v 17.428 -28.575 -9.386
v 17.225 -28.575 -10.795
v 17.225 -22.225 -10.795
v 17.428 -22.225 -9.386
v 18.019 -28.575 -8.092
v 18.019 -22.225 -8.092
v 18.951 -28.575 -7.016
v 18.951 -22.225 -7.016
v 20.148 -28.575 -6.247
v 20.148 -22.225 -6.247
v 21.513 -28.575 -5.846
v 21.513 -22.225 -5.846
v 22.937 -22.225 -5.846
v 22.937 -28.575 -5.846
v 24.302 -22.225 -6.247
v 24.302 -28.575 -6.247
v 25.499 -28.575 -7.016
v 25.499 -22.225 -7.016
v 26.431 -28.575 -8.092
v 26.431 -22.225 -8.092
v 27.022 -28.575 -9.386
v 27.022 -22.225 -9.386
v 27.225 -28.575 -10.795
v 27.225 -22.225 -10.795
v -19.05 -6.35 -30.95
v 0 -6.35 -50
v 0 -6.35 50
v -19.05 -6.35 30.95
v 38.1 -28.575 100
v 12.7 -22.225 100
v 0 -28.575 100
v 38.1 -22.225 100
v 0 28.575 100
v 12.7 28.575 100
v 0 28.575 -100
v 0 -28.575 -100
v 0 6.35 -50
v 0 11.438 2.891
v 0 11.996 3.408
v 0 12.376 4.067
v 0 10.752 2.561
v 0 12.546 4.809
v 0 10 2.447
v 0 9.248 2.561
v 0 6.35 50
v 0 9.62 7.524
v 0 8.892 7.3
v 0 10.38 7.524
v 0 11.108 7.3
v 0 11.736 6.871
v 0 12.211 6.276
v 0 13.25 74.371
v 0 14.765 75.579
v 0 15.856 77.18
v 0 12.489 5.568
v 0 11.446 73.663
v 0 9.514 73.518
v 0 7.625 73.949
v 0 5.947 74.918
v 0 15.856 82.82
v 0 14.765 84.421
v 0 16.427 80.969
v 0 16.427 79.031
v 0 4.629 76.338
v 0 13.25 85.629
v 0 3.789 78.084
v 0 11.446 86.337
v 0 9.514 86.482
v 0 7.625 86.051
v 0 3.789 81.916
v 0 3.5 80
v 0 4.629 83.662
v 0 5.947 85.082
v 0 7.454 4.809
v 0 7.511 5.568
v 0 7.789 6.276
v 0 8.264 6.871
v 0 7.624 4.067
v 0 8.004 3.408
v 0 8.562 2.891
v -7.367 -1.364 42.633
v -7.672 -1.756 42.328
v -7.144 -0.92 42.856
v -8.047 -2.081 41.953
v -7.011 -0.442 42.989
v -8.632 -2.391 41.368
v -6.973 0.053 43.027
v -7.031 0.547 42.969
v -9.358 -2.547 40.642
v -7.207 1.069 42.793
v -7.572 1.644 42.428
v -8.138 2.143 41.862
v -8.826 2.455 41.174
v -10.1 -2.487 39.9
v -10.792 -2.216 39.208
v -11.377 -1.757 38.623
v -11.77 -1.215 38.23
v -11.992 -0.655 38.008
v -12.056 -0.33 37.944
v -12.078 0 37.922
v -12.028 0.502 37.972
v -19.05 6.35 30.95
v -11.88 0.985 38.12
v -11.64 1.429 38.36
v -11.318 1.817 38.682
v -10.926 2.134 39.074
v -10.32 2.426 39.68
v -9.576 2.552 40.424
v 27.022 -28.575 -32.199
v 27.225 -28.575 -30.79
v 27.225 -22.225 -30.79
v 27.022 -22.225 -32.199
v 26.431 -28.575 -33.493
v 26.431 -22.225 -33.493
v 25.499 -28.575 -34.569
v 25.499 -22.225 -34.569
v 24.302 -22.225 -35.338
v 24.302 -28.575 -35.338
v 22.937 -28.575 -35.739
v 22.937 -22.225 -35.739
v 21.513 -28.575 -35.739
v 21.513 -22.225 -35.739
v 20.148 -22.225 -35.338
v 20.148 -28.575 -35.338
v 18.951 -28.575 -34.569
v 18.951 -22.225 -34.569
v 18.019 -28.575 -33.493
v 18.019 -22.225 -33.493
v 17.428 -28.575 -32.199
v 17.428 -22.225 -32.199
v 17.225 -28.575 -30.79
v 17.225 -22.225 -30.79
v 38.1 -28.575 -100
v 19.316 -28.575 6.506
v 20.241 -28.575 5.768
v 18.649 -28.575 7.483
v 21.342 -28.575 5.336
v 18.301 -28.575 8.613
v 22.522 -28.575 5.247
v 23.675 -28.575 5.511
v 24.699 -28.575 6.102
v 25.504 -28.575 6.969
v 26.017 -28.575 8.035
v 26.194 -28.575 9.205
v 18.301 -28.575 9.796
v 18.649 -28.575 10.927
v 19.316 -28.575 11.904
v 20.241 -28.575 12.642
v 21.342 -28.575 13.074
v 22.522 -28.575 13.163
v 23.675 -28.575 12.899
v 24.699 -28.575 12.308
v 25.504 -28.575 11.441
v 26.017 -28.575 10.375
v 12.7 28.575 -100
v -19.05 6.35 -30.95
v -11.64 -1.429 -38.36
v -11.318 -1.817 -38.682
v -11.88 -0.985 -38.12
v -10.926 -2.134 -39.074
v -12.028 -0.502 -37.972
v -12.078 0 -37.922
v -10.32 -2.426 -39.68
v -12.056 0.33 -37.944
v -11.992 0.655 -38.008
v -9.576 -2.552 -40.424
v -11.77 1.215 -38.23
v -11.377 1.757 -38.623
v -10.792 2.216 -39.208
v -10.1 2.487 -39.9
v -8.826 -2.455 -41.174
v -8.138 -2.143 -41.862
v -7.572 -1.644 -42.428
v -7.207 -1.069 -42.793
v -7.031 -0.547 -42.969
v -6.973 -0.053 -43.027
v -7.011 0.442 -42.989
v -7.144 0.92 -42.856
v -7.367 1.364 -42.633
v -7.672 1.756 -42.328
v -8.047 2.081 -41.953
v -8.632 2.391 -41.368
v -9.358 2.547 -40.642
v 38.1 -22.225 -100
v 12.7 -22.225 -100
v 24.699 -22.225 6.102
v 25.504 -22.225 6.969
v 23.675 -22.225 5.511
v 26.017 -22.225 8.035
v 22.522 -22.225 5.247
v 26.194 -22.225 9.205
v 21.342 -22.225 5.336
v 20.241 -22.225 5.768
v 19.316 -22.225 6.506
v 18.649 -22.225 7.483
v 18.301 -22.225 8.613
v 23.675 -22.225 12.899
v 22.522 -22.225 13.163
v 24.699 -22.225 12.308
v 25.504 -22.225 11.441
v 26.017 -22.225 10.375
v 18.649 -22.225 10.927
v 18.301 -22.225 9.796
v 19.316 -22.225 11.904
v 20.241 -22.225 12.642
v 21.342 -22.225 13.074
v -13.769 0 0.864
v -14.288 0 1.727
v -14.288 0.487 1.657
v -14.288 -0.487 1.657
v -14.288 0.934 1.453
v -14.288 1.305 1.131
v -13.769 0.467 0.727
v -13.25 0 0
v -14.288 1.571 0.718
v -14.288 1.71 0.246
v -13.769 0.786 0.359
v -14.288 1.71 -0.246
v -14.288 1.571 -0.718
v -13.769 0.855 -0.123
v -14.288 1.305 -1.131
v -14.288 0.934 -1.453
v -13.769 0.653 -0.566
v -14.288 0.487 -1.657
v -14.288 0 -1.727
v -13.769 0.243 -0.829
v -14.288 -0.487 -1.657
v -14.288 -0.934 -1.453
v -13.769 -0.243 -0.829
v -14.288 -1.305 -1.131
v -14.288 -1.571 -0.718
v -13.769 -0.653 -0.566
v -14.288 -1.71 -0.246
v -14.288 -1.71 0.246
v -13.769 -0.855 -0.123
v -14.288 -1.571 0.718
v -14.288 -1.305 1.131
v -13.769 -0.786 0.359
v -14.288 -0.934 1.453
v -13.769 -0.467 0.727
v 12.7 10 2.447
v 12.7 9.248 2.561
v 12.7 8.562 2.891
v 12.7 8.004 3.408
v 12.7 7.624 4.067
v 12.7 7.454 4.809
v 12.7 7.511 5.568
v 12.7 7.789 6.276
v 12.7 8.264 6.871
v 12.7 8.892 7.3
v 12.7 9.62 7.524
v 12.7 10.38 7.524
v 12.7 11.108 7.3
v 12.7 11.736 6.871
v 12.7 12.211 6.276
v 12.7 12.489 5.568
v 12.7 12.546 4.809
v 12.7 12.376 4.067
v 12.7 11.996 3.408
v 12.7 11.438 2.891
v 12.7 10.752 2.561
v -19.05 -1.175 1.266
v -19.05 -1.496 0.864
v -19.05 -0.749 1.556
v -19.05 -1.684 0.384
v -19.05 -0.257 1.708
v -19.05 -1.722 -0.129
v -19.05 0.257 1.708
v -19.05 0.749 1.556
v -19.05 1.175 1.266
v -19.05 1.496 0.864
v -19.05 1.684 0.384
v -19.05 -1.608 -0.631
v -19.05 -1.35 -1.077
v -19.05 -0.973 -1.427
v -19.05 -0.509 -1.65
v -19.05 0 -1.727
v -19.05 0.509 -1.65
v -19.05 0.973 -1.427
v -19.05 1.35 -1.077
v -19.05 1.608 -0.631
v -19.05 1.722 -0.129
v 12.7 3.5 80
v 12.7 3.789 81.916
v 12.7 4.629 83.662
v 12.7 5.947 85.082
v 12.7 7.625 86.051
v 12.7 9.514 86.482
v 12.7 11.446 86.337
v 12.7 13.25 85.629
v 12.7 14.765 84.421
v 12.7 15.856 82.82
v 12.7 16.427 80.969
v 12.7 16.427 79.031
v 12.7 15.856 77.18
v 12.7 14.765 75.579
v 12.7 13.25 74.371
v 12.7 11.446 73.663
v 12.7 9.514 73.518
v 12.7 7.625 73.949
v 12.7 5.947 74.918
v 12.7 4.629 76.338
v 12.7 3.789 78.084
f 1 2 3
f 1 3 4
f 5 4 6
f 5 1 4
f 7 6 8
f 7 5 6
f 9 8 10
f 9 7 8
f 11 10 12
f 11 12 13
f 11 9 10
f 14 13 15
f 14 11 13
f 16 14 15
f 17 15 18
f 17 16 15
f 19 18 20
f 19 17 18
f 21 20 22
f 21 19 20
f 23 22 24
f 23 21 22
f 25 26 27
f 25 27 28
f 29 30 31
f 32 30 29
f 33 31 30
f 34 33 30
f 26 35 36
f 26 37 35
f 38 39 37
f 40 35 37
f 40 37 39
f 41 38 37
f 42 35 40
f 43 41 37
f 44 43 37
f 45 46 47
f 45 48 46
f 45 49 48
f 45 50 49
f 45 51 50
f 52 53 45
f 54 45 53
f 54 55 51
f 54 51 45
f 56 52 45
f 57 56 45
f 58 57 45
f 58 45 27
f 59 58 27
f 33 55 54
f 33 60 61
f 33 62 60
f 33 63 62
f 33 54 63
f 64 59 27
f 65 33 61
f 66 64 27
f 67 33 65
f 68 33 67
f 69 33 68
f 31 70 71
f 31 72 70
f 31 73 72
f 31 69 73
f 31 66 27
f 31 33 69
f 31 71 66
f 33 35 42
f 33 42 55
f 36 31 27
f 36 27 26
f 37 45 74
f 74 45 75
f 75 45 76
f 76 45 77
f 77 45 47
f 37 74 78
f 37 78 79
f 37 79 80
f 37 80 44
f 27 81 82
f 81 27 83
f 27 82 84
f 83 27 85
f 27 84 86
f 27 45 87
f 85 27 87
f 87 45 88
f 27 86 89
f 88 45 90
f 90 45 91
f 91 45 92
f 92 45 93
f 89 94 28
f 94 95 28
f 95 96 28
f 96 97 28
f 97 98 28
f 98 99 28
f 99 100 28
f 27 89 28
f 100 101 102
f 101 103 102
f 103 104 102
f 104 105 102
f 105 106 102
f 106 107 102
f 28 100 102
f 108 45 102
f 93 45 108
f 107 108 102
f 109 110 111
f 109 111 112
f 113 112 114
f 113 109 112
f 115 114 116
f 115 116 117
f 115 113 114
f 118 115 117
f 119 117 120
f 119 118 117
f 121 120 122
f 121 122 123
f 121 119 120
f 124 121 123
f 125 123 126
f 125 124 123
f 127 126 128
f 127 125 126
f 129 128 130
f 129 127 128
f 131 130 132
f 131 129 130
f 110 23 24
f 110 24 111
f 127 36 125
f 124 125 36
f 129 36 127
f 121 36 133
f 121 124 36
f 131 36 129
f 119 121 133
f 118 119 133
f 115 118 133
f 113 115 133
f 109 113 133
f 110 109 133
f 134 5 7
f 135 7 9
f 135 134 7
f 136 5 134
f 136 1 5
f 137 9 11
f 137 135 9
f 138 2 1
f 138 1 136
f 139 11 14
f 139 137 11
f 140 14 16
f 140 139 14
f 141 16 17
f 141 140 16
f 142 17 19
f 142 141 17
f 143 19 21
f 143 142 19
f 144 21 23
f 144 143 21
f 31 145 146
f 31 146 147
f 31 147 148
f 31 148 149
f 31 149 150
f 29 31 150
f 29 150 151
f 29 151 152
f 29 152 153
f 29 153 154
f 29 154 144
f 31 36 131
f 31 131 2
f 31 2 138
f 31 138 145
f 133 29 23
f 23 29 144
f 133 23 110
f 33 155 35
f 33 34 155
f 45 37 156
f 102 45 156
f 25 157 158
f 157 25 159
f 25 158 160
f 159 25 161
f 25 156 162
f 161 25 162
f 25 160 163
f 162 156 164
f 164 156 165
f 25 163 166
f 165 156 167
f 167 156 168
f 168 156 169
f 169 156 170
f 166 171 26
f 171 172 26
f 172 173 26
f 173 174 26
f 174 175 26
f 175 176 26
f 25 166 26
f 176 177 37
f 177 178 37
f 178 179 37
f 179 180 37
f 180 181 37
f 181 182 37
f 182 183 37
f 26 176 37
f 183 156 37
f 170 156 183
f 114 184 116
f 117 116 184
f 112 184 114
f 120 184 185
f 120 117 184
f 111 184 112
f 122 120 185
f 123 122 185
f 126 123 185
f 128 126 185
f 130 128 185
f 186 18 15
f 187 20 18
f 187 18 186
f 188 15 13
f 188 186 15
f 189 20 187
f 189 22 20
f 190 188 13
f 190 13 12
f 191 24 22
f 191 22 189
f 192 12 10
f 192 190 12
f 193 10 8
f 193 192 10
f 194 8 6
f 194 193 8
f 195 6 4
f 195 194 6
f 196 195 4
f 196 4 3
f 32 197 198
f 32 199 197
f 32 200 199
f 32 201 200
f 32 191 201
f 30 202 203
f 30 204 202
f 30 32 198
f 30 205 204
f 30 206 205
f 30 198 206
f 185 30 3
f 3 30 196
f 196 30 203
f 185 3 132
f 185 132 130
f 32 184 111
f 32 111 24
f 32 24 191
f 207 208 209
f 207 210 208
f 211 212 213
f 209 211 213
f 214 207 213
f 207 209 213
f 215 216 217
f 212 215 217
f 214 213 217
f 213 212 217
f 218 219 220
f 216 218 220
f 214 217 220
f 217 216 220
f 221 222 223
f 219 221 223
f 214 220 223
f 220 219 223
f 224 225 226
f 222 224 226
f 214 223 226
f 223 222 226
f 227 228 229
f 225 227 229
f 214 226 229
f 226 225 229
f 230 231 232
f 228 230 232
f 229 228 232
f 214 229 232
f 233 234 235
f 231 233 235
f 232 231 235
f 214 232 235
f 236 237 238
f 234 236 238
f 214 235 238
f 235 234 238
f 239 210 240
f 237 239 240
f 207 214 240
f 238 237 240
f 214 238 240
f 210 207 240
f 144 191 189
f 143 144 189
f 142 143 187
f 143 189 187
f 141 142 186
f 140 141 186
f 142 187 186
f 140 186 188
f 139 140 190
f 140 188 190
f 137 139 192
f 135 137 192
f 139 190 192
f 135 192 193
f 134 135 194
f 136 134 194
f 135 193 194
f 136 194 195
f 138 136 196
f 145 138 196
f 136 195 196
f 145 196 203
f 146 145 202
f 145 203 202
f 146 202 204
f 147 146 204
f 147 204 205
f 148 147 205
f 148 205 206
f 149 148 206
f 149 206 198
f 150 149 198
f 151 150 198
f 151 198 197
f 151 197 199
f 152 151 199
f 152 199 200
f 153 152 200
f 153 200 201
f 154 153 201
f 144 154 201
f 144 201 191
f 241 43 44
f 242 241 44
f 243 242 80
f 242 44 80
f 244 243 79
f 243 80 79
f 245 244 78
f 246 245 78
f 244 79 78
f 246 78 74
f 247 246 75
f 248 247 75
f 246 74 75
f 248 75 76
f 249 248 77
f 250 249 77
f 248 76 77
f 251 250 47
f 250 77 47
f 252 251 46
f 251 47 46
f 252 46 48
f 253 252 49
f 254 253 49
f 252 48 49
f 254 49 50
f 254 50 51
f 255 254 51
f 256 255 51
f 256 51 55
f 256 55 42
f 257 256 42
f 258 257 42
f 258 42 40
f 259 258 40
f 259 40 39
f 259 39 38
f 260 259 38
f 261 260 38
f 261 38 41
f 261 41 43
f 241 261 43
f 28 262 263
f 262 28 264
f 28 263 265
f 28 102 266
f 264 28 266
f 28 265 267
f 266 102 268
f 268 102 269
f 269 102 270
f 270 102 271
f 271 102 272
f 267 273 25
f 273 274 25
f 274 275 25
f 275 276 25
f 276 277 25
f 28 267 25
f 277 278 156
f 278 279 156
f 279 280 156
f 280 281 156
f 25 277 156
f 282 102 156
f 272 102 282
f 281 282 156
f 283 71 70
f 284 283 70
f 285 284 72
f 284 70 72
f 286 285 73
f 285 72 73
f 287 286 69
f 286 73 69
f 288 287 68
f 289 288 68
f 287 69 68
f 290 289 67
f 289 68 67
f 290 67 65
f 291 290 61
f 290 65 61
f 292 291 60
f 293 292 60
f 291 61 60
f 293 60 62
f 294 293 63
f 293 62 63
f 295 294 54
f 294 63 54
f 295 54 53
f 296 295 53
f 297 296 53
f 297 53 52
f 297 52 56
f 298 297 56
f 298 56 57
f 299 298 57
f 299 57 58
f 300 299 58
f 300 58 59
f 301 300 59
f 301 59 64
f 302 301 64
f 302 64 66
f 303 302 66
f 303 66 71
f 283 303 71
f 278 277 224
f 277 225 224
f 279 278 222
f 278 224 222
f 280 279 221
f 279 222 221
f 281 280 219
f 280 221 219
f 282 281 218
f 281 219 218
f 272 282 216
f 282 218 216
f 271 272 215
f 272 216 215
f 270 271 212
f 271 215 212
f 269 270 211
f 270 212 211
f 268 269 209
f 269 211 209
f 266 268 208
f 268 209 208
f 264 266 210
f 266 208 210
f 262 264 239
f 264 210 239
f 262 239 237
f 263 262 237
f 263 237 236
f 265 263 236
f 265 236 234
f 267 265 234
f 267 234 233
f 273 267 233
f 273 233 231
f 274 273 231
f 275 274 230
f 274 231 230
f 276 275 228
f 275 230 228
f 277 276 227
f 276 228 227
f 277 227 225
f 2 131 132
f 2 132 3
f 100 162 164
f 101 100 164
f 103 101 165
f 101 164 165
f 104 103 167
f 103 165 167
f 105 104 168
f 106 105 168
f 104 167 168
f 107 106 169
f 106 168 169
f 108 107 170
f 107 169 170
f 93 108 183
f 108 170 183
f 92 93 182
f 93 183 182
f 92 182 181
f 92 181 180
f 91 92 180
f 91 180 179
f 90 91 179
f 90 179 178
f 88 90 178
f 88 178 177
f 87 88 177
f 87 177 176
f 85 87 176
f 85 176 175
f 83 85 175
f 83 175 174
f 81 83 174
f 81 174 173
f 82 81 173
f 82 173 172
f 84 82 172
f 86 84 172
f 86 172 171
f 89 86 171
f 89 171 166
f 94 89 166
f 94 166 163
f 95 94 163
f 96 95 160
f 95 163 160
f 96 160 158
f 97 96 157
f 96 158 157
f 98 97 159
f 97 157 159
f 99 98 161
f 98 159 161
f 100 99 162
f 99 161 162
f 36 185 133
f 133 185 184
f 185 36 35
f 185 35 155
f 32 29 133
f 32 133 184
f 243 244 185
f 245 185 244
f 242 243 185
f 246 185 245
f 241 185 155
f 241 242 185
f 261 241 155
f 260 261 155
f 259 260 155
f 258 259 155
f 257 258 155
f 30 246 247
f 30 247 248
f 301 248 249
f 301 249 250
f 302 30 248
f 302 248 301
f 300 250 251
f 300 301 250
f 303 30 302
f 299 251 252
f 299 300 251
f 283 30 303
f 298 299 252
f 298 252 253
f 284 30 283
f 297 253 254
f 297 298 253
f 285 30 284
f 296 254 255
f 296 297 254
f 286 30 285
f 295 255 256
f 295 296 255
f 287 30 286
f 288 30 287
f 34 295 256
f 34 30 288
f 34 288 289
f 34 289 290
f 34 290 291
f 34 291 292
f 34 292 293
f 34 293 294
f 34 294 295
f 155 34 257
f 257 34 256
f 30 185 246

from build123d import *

# Parameters (mm, degrees)
SALIENTE_EXTRUIR1_DEPTH       = 100
SALIENTE_EXTRUIR2_DEPTH       = 6.35
TALADRO_ROSCADO_1_4_202_D     = 5.1054
TALADRO_ROSCADO_8_321_D       = 3.4544
TALADRO_ROSCADO_8_321_DEPTH   = 4.7625
TALADRO_ROSCADO_8_321_TIP     = 1.037806461
CROQUIS10_R                   = 6.5
CORTAR_EXTRUIR1_DEPTH         = 111.761638779
CORTAR_EXTRUIR2_DEPTH         = 6.35
TALADRO_ROSCADO_1_4_203_D     = 5.1054
TALADRO_ROSCADO_1_4_203_DEPTH = 13
TALADRO_ROSCADO_1_4_203_TIP   = 1.533816902
F_3_8_16_TAPPED_HOLE1_D       = 7.9375
F_3_8_16_TAPPED_HOLE1_DEPTH   = 23.81
F_3_8_16_TAPPED_HOLE1_TIP     = 2.384665582


with BuildPart() as part:
    # Croquis1 → Saliente-Extruir1 (new, symmetric)
    with BuildSketch(Plane.XY):
        Polygon((12.7, 28.575), (0, 28.575), (0, 0), (0, -28.575), (38.1, -28.575), (38.1, -22.225), (12.7, -22.225), (12.7, 22.225), align=None)
    extrude(amount=SALIENTE_EXTRUIR1_DEPTH, both=True)

    # Croquis2 → Saliente-Extruir2 (add, symmetric)
    with BuildSketch(Plane(origin=(0, 0, 0), x_dir=(1, 0, 0), z_dir=(0, 1, 0))):
        Polygon((0, 50), (0, -50), (-19.05, -30.95), (-19.05, 30.95), align=None)
    extrude(amount=SALIENTE_EXTRUIR2_DEPTH, both=True)

    # Taladro roscado 1/4-202 (through all)
    with Locations(Plane.XY.offset(50)):
        with Locations((-9.525, 0)):
            Hole(TALADRO_ROSCADO_1_4_202_D / 2)

    # Taladro roscado #8-321
    with Locations(Plane.ZY.offset(19.05)):
        with Locations((0, 0)):
            Hole(TALADRO_ROSCADO_8_321_D / 2, depth=TALADRO_ROSCADO_8_321_DEPTH)
            with Locations((0, 0, -(TALADRO_ROSCADO_8_321_DEPTH + TALADRO_ROSCADO_8_321_TIP / 2))):  # 118° drill point
                Cone(0, TALADRO_ROSCADO_8_321_D / 2, TALADRO_ROSCADO_8_321_TIP, mode=Mode.SUBTRACT)

    # Croquis10 → Cortar-Extruir1 (cut, through all)
    with BuildSketch(Plane.ZY):
        with Locations(Location((80, 10, 0), (0, 0, 270))):
            Circle(CROQUIS10_R)
    extrude(amount=-CORTAR_EXTRUIR1_DEPTH, mode=Mode.SUBTRACT)

    # Croquis13 → Cortar-Extruir2 (cut)
    with BuildSketch(Plane.XZ.offset(28.575)):
        with BuildLine():
            Line((27.225, -10.795039516), (27.225, -30.790076058))
            ThreePointArc((27.225, -30.790076058), (22.225, -35.790076058), (17.225, -30.790076058))
            Line((17.225, -30.790076058), (17.225, -10.795039516))
            ThreePointArc((17.225, -10.795039516), (22.225, -5.795039516), (27.225, -10.795039516))
        make_face()
    extrude(amount=-CORTAR_EXTRUIR2_DEPTH, mode=Mode.SUBTRACT)

    # Taladro roscado 1/4-203
    with Locations(Plane(origin=(12.7, 0, 0), x_dir=(0, 0, 1), z_dir=(1, 0, 0))):
        with Locations((5, -10)):
            Hole(TALADRO_ROSCADO_1_4_203_D / 2, depth=TALADRO_ROSCADO_1_4_203_DEPTH)
            with Locations((0, 0, -(TALADRO_ROSCADO_1_4_203_DEPTH + TALADRO_ROSCADO_1_4_203_TIP / 2))):  # 118° drill point
                Cone(0, TALADRO_ROSCADO_1_4_203_D / 2, TALADRO_ROSCADO_1_4_203_TIP, mode=Mode.SUBTRACT)

    # 3/8-16 Tapped Hole1
    with Locations(Plane(origin=(0, -28.575, 0), x_dir=(-1, 0, 0), z_dir=(0, -1, 0))):
        with Locations((-22.225, -9.204960484)):
            Hole(F_3_8_16_TAPPED_HOLE1_D / 2, depth=F_3_8_16_TAPPED_HOLE1_DEPTH)
            with Locations((0, 0, -(F_3_8_16_TAPPED_HOLE1_DEPTH + F_3_8_16_TAPPED_HOLE1_TIP / 2))):  # 118° drill point
                Cone(0, F_3_8_16_TAPPED_HOLE1_D / 2, F_3_8_16_TAPPED_HOLE1_TIP, mode=Mode.SUBTRACT)


solid = part.part
